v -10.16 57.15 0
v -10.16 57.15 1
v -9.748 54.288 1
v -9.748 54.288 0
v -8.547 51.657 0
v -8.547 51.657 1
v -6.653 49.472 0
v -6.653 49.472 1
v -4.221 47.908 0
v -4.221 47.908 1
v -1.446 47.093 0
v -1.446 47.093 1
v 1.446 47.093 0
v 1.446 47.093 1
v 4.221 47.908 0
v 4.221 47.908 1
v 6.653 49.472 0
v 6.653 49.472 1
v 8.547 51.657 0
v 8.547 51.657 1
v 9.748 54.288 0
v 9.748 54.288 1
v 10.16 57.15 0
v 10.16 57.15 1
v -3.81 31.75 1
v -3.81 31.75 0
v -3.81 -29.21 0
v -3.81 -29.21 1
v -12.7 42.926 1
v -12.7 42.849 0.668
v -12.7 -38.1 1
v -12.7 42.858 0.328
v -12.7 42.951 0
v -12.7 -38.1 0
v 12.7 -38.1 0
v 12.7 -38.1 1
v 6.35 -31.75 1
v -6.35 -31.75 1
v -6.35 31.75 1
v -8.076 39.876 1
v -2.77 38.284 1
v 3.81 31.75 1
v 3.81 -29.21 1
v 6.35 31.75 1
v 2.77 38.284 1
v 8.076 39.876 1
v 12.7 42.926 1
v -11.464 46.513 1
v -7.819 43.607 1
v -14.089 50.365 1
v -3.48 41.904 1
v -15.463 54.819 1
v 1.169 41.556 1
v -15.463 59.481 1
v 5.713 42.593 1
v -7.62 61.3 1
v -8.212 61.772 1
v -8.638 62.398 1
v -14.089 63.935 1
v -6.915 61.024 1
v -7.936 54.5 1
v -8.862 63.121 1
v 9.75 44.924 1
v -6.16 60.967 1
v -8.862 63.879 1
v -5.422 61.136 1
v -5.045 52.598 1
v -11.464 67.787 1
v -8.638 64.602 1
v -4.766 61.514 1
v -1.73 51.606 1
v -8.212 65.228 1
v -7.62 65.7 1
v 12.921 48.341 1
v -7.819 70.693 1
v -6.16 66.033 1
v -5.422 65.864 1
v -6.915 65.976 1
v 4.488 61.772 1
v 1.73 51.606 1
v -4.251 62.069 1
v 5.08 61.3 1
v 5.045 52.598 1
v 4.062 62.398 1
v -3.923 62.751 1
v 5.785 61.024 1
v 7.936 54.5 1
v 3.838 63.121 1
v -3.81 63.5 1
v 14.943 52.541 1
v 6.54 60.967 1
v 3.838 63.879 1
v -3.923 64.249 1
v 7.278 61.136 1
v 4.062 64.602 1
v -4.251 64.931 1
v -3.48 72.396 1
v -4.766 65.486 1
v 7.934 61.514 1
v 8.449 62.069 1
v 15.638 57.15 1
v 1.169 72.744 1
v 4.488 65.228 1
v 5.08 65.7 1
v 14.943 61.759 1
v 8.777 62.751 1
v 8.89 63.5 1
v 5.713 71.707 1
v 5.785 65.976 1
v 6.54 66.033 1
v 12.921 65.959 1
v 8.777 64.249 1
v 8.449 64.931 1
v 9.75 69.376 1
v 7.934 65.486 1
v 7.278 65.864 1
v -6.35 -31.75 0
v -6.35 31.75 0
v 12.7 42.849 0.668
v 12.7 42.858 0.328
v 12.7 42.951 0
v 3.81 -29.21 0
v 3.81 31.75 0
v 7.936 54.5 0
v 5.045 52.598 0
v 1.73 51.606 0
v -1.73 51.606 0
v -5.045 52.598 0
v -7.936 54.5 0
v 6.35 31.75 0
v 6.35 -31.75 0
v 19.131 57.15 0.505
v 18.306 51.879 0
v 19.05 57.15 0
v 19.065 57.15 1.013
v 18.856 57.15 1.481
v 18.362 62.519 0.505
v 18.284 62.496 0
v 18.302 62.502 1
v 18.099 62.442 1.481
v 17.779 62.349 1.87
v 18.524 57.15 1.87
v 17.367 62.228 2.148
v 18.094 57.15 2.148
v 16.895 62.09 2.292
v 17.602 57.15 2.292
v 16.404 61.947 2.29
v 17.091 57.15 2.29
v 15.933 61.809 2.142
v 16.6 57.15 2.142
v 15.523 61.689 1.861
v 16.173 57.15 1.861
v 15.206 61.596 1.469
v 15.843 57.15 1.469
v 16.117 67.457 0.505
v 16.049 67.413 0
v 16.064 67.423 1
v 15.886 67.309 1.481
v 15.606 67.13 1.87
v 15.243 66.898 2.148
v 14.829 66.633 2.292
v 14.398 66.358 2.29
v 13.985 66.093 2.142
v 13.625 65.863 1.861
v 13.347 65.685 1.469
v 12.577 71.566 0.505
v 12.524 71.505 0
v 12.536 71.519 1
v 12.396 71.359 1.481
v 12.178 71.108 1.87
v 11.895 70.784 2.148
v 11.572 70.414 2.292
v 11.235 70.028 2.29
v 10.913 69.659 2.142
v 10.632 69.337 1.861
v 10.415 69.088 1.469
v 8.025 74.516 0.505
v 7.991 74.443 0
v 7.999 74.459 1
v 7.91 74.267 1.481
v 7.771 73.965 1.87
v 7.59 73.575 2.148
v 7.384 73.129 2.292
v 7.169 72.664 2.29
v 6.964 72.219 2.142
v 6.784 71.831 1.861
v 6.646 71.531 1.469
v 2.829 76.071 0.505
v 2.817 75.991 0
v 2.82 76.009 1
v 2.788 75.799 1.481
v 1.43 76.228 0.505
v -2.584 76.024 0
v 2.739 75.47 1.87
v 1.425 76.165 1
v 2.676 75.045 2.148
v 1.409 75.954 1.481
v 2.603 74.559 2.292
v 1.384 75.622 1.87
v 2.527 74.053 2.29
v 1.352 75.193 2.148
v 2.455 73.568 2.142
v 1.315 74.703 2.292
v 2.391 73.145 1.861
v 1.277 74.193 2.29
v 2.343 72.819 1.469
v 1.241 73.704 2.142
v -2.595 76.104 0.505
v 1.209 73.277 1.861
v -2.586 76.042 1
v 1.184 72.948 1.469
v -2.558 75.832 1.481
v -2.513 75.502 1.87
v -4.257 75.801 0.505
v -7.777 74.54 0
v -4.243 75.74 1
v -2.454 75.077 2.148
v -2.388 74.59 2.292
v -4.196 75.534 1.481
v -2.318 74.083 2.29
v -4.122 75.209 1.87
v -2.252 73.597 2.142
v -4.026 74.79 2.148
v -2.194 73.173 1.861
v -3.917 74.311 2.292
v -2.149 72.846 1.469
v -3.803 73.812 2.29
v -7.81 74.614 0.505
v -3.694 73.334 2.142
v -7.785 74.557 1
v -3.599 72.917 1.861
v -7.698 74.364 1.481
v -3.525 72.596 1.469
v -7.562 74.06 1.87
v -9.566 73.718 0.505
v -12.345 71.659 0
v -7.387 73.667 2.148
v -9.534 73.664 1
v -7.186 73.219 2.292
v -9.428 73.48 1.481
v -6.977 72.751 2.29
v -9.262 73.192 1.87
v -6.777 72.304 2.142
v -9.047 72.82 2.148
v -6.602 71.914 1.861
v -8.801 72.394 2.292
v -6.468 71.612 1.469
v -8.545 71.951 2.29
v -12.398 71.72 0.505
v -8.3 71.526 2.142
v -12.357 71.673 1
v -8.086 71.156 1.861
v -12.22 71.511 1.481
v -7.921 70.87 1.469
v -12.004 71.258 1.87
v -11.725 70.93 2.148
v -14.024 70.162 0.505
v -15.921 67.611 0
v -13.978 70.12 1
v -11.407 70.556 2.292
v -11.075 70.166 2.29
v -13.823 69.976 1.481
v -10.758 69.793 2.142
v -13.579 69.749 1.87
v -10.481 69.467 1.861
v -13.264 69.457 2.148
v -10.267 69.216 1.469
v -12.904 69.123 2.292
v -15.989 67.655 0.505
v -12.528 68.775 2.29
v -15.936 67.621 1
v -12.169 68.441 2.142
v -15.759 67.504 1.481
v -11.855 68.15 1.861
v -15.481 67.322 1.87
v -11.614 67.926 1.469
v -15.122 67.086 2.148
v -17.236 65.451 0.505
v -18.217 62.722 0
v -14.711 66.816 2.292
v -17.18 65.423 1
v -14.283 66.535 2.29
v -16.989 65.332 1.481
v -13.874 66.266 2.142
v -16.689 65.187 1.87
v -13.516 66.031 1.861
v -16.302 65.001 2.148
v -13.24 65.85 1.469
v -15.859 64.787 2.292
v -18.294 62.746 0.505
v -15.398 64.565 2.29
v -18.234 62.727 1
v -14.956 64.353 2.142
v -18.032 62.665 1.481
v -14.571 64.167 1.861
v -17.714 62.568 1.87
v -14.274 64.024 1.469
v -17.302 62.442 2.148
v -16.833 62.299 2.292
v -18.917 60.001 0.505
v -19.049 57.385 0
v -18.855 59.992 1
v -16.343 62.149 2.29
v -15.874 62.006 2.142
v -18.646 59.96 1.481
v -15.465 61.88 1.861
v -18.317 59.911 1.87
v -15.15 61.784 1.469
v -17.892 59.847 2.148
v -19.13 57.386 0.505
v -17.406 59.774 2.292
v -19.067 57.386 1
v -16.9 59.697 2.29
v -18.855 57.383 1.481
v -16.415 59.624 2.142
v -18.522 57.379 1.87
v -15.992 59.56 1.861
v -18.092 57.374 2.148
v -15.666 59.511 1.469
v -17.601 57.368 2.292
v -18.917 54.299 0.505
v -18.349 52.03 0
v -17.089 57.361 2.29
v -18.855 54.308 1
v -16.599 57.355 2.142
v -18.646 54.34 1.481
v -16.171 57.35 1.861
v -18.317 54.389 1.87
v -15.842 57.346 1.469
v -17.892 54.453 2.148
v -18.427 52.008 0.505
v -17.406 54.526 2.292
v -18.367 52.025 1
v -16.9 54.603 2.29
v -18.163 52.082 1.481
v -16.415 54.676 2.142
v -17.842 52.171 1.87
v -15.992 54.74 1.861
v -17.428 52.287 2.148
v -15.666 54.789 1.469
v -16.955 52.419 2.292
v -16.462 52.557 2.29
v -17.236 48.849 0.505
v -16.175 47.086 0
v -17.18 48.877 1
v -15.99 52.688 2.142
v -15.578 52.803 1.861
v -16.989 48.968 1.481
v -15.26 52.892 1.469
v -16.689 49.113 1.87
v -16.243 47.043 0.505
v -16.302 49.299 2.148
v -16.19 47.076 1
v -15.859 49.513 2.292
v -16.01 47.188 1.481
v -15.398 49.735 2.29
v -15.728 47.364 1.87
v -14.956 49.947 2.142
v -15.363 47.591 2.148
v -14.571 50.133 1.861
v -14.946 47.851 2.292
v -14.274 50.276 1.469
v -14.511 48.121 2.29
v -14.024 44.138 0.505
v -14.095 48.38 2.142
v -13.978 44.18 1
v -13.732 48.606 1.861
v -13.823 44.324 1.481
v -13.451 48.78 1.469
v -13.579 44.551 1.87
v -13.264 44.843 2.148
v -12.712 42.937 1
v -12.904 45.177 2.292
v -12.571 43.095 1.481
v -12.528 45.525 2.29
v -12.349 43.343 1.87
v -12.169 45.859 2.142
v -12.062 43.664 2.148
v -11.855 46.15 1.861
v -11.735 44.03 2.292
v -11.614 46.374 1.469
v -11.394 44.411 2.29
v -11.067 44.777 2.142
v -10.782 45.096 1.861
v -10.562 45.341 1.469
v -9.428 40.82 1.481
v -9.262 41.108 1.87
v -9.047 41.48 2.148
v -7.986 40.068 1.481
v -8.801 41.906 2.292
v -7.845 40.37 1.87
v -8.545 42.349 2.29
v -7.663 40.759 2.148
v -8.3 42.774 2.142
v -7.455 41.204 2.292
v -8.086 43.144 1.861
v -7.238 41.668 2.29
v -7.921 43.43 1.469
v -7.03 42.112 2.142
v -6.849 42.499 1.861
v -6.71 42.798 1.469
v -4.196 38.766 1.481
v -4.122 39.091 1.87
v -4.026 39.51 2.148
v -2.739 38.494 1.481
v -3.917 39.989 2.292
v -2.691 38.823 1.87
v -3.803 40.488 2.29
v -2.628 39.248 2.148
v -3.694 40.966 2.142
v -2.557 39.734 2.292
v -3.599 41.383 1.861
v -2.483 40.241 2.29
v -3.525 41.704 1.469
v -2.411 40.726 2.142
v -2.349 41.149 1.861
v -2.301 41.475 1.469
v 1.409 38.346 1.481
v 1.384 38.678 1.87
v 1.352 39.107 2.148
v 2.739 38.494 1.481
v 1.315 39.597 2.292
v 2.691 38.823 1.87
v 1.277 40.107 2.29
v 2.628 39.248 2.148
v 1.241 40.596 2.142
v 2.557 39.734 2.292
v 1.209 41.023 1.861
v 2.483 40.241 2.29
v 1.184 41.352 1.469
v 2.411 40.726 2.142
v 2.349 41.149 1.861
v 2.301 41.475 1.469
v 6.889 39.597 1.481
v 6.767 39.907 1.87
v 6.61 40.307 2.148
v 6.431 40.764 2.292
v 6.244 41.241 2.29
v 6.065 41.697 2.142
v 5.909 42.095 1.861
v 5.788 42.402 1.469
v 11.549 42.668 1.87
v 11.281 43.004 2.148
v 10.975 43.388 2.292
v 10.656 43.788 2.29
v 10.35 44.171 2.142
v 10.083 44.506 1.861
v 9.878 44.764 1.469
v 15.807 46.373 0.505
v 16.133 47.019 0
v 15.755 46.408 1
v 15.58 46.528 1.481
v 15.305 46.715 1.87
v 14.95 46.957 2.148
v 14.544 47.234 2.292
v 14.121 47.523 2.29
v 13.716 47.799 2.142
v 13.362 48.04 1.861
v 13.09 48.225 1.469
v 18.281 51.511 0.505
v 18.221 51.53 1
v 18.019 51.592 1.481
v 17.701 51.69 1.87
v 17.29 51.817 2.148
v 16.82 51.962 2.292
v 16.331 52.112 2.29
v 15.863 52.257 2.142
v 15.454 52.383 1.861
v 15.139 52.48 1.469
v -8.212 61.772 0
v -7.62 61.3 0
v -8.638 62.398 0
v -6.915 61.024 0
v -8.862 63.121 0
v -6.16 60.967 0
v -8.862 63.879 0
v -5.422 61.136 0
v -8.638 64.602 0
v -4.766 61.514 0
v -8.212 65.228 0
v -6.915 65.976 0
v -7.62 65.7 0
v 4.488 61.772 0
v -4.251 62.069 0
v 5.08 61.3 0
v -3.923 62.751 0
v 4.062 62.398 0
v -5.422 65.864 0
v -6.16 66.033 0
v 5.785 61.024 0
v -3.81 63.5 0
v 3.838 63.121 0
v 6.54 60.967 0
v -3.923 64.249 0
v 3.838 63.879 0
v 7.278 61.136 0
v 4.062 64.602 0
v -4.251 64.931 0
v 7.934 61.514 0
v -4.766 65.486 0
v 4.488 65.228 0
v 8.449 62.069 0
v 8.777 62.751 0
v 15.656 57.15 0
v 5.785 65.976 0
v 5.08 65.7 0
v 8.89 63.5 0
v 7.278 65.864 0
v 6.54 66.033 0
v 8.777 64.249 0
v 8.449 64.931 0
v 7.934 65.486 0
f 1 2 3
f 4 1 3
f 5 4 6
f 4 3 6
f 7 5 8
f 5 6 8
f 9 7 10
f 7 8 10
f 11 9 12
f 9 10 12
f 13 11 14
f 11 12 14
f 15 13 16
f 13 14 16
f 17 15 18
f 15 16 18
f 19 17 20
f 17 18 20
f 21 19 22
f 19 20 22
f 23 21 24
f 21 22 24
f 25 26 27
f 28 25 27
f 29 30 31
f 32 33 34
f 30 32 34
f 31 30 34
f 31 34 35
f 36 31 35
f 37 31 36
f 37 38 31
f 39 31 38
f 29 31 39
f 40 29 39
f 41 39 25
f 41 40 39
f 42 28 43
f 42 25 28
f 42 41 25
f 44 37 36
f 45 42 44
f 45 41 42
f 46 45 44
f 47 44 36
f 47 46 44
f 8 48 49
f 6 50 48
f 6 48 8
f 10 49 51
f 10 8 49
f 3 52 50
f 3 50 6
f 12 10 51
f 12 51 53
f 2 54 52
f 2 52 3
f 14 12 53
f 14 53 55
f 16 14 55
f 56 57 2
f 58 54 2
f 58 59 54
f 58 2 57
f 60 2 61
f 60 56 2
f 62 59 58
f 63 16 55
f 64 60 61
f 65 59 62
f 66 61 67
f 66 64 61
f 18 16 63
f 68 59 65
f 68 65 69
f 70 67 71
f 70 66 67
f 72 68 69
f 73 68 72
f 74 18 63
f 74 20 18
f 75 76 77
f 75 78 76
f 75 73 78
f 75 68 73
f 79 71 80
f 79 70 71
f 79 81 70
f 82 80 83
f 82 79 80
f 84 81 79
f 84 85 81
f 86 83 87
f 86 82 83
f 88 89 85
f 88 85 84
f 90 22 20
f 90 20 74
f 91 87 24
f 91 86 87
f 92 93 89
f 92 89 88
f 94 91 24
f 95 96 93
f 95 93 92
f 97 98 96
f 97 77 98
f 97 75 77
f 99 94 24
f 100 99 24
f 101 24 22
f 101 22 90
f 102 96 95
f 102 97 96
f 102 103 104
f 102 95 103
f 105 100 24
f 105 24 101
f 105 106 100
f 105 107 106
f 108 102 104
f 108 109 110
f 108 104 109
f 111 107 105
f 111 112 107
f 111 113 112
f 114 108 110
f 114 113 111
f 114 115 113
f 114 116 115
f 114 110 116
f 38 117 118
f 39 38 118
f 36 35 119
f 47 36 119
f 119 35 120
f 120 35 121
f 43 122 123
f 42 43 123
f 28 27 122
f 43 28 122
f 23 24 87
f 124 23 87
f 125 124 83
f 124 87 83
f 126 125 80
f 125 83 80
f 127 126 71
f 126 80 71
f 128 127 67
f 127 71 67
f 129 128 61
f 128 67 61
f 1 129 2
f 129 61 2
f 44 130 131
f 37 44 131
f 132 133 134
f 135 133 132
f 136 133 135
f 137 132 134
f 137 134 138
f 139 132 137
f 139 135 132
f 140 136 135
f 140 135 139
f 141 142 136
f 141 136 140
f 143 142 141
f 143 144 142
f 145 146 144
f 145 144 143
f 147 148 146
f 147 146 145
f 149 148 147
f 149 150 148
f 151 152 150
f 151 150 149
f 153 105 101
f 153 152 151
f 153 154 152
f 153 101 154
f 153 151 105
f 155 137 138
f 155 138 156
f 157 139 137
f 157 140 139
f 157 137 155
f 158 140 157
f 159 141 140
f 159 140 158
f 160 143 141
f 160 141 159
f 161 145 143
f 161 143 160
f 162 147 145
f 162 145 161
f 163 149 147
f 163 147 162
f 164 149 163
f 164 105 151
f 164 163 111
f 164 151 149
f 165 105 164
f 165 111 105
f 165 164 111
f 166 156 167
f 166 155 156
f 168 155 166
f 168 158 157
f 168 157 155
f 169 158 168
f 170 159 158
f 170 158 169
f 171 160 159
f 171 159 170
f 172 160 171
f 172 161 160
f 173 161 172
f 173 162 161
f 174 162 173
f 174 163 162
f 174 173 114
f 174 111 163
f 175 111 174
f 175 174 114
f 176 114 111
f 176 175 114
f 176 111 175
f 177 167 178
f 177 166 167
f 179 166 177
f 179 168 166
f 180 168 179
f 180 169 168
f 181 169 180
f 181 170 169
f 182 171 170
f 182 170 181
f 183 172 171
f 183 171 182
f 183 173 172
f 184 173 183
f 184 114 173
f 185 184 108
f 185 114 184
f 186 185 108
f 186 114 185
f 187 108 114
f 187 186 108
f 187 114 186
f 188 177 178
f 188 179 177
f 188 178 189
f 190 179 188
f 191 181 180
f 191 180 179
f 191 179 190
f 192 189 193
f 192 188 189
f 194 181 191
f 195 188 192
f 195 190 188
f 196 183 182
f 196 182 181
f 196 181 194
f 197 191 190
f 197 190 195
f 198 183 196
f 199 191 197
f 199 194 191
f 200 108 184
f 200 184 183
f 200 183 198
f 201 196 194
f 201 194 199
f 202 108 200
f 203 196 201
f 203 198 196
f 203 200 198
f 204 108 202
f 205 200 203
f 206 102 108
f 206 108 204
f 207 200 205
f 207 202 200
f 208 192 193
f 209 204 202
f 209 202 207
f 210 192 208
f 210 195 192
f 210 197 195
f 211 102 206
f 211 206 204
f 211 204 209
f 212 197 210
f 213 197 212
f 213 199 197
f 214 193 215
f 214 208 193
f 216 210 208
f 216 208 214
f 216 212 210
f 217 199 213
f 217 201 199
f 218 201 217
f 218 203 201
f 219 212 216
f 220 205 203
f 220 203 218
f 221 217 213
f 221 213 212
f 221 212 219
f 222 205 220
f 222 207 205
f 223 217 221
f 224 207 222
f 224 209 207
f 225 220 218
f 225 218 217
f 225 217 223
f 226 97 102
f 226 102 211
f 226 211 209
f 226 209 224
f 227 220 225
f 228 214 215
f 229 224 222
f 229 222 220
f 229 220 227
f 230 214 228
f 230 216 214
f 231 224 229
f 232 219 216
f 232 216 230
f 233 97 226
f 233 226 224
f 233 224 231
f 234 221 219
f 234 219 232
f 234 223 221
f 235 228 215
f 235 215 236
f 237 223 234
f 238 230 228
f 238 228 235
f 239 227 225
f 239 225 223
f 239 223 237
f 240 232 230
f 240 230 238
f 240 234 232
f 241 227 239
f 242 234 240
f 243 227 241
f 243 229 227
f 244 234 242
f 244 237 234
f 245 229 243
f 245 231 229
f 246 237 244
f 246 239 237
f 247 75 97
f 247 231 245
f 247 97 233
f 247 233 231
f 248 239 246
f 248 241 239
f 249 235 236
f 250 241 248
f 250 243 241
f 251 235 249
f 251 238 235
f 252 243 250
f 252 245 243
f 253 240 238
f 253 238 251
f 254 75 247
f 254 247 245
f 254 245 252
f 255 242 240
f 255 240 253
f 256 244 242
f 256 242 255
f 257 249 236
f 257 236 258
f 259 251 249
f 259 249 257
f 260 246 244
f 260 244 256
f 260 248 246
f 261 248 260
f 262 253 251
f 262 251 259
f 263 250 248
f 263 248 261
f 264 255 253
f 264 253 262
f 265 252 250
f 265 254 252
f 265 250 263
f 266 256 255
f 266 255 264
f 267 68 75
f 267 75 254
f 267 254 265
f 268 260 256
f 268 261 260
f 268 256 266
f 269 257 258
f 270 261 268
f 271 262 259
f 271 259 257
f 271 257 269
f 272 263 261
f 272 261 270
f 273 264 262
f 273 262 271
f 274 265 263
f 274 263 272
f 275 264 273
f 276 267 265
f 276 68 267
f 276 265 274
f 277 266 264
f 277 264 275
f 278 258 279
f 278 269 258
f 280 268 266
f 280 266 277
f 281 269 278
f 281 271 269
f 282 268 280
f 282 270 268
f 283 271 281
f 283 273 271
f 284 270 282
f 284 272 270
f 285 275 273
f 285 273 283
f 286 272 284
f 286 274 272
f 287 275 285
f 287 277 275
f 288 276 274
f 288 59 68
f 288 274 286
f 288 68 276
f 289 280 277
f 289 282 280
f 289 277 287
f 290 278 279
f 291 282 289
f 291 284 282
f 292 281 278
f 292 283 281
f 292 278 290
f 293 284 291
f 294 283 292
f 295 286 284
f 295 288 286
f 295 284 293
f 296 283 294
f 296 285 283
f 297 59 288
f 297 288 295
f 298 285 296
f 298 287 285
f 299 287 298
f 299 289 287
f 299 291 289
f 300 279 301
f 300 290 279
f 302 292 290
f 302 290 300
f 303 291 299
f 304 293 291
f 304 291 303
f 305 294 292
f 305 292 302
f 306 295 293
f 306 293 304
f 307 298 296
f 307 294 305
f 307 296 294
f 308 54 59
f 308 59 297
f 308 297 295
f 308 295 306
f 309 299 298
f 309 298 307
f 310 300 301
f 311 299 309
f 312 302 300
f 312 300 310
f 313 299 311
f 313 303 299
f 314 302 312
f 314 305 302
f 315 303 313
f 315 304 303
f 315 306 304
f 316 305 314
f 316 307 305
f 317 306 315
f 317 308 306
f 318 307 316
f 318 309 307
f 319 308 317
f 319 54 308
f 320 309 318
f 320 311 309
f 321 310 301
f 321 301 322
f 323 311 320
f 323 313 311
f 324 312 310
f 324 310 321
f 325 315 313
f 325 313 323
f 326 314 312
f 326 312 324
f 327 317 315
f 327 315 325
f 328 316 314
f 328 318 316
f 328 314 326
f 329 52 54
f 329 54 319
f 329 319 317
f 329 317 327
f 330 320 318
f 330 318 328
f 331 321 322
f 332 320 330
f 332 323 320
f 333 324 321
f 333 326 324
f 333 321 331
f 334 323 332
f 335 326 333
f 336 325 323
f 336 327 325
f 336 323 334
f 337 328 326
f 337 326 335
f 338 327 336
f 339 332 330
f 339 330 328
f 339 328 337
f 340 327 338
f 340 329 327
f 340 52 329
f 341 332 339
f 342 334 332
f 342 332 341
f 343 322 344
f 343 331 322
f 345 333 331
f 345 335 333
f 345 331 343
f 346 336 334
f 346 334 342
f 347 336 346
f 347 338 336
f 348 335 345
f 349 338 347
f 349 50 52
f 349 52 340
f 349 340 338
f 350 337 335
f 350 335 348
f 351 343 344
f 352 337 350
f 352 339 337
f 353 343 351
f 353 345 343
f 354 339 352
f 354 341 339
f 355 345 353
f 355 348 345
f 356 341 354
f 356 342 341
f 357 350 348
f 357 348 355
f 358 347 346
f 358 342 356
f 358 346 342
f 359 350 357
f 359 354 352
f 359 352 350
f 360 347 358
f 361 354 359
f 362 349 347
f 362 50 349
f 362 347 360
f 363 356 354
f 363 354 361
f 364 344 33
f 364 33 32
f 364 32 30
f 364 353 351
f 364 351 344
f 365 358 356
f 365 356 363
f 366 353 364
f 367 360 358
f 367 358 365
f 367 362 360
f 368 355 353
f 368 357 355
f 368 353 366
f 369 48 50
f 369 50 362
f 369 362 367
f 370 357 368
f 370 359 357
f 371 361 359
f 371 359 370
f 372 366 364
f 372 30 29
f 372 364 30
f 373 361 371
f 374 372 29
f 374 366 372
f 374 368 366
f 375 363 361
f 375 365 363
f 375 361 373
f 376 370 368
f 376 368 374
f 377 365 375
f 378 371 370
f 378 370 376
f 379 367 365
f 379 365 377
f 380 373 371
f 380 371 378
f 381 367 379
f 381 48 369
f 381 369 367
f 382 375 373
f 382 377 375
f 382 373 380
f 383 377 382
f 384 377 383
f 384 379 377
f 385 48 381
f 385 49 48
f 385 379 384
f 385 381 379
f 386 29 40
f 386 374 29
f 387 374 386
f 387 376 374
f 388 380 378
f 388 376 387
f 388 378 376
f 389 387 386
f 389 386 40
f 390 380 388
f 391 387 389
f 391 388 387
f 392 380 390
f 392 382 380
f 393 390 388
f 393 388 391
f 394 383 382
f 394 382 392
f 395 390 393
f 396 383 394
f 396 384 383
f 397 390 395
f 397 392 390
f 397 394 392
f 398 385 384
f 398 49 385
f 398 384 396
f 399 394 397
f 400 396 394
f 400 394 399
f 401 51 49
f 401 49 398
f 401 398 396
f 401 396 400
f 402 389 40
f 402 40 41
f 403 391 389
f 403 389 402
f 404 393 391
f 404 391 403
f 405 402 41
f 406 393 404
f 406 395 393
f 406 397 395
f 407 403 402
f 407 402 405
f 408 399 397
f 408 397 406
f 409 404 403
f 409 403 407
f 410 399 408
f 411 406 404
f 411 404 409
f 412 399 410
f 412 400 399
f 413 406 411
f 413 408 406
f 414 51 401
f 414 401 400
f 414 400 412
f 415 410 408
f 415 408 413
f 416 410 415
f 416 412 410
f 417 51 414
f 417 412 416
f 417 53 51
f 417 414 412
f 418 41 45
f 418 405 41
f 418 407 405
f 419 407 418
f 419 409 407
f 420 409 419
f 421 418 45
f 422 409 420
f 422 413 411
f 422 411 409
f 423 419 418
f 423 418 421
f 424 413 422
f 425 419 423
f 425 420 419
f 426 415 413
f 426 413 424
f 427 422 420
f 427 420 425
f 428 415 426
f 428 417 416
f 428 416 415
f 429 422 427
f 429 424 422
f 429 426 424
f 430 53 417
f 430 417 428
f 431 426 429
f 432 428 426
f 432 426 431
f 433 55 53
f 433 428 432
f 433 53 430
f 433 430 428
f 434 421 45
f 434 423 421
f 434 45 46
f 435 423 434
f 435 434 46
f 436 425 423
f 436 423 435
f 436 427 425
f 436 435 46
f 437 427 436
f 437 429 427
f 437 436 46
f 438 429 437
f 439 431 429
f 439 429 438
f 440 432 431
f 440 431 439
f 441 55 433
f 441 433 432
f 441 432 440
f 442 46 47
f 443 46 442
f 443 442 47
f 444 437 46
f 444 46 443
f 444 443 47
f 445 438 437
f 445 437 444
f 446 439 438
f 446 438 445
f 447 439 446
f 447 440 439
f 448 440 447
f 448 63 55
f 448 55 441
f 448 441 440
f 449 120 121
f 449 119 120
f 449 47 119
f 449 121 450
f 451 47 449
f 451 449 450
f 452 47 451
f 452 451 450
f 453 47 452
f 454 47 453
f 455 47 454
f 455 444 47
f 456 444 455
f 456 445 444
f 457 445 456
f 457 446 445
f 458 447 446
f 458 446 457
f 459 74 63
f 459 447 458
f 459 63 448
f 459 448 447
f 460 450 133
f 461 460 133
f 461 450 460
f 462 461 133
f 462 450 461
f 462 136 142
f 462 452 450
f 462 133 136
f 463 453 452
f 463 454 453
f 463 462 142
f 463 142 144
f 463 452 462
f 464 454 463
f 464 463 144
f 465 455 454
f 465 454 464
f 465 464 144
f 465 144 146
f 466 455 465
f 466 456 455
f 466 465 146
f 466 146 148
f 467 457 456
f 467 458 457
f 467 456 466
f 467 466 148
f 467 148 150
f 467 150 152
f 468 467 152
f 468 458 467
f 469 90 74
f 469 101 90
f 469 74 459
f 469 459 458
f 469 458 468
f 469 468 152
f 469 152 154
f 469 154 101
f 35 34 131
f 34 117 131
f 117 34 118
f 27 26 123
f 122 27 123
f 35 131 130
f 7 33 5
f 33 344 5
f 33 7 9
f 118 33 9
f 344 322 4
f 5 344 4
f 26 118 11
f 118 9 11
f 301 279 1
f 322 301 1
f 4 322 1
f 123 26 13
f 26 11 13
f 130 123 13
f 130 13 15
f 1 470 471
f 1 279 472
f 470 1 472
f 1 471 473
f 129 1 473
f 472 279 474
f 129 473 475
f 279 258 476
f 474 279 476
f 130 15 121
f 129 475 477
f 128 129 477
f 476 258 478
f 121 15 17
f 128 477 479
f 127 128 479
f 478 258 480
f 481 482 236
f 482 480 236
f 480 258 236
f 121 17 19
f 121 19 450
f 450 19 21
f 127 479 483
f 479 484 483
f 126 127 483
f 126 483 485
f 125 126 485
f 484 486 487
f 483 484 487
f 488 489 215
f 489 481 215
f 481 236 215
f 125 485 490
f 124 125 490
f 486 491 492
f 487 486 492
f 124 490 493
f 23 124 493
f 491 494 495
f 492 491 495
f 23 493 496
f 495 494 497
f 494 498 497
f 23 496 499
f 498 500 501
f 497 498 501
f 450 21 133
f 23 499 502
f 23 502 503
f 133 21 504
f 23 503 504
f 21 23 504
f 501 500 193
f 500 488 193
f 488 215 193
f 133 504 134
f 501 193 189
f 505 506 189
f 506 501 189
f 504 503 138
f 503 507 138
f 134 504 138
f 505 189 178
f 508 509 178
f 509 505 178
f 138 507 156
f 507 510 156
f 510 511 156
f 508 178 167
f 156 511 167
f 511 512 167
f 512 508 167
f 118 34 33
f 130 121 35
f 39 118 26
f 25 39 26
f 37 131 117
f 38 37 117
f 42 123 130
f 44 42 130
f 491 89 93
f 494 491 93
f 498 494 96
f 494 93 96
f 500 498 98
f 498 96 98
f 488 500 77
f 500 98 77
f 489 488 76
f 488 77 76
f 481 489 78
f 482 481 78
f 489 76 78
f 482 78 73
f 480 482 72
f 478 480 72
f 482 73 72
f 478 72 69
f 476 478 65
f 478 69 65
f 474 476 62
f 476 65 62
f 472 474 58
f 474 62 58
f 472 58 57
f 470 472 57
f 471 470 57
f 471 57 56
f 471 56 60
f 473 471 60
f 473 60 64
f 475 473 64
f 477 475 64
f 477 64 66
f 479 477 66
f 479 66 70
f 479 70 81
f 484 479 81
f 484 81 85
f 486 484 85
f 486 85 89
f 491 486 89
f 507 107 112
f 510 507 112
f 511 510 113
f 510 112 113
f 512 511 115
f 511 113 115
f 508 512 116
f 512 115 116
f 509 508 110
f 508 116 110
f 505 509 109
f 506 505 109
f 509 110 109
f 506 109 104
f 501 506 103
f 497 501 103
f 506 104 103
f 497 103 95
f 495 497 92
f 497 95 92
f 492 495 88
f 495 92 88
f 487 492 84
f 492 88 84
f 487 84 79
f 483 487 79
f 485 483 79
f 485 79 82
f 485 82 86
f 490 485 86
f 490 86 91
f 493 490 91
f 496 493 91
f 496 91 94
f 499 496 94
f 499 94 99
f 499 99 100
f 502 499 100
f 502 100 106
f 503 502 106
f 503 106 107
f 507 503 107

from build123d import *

# Parameters (mm, degrees)
F0_W      = 25.4
F0_H      = 76.2
F1_DEPTH  = 1
F3_DEPTH  = 1
F8_R      = 2.54
F9_DEPTH  = 1.0010001
F11_DEPTH = 1.0010001


with BuildPart() as f1:
    # F0 (on Top) → F1 (new body)
    with BuildSketch(Plane.XY):
        Rectangle(F0_W, F0_H)
        Polygon((-6.35, -31.75), (-6.35, 31.75), (-3.81, 31.75), (3.81, 31.75), (6.35, 31.75), (6.35, -31.75), align=None, mode=Mode.SUBTRACT)
        Polygon((3.81, 31.75), (-3.81, 31.75), (-3.81, 29.21), (-3.81, -29.21), (3.81, -29.21), (3.81, 29.21), align=None)
    extrude(amount=F1_DEPTH)

    # F2 (on Top) → F3 (join)
    with BuildSketch(Plane.XY):
        with BuildLine():
            ThreePointArc((12.7, 42.9509683429), (17.3901912008, 49.3728700667), (19.05, 57.15))
            ThreePointArc((19.05, 57.15), (0, 76.2), (-19.05, 57.15))
            ThreePointArc((-19.05, 57.15), (-17.3901912008, 49.3728700667), (-12.7, 42.9509683429))
            ThreePointArc((-12.7, 42.9509683429), (0, 38.1), (12.7, 42.9509683429))
        make_face()
        with BuildLine():
            Line((12.7, 33.2490316571), (12.7, 42.9509683429))
            ThreePointArc((12.7, 42.9509683429), (0, 38.1), (-12.7, 42.9509683429))
            Line((-12.7, 42.9509683429), (-12.7, 33.2490316571))
            Line((-12.7, 33.2490316571), (12.7, 33.2490316571))
        make_face()
    extrude(amount=F3_DEPTH)

    # F7: sweep along a path in F6
    with BuildLine(Plane.XY.offset(1)) as f7_path:
        CenterArc((0, 57.15), 19.05, 0, 360)
    # F5 (on offset) → F7 (sweep)
    with BuildSketch(Plane.XZ.offset(-57.15)):
        with BuildLine():
            Line((-19.05, 0), (-15.6564548698, 0))
            ThreePointArc((-15.6564548698, 0), (-17.3532274349, 2.3092691054), (-19.05, 0))
        make_face()
    sweep(path=f7_path.line)

    # F8 (on face) → F9 (cut, through all)
    with BuildSketch(Plane.XY.offset(1)):
        with Locations((-6.35, 63.5)):
            Circle(F8_R)
        with Locations((6.35, 63.5)):
            Circle(F8_R)
    extrude(amount=-F9_DEPTH, mode=Mode.SUBTRACT)

    # F10 (on face) → F11 (cut, through all)
    with BuildSketch(Plane.XY.offset(1)):
        with BuildLine():
            ThreePointArc((10.16, 57.15), (0, 51.4801930411), (-10.16, 57.15))
            ThreePointArc((-10.16, 57.15), (0, 46.99), (10.16, 57.15))
        make_face()
    extrude(amount=-F11_DEPTH, mode=Mode.SUBTRACT)


solid = f1.part
